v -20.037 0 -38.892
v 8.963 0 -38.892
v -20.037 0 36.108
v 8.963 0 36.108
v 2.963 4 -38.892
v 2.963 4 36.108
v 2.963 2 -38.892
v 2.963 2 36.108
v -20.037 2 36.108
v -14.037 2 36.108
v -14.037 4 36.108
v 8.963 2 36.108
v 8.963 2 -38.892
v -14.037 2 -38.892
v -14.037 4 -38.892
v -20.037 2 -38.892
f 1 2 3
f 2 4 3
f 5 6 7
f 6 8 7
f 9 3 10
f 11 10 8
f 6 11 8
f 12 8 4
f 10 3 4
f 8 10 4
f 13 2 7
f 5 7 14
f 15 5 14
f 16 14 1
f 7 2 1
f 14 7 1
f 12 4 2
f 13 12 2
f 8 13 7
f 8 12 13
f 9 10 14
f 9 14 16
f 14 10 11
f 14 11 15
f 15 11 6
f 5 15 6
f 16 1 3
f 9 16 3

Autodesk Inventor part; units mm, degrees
ref_plane "YZ Plane" through (0, 0, 0) normal (1, 0, 0) x (0, 1, 0)
ref_plane "XZ Plane" through (0, 0, 0) normal (0, 1, 0) x (-1, 0, 0)
ref_plane "XY Plane" through (0, 0, 0) normal (0, 0, 1) x (1, 0, 0)
sketch "Sketch1" plane through (0, 0, 0) normal (0, 1, 0) x (-1, 0, 0)
  line L0 (20.0371, 36.1085) -> (-8.9629, 36.1085)
  line L1 (-8.9629, 36.1085) -> (-8.9629, -38.8915)
  line L2 (-8.9629, -38.8915) -> (20.0371, -38.8915)
  line L3 (20.0371, -38.8915) -> (20.0371, 36.1085)
  point P0 (0, 0)
  dimension "d0" = 75
  dimension "d1" = 29
extrude "Extrusion1" add sketch "Sketch1" along normal blind 2
sketch "Sketch2" plane through (0, 2, 0) normal (0, 1, 0) x (1, 0, 0)
  line L0 (-20.0371, -36.1085) -> (8.9629, -36.1085) projected
  line L1 (2.9629, -36.1085) -> (2.9629, 38.8915)
  line L2 (8.9629, 38.8915) -> (-20.0371, 38.8915) projected
  line L3 (-14.0371, -36.1085) -> (-14.0371, 38.8915)
  point P0 (0, 0)
  dimension "d4" = 6
  dimension "d5" = 6
extrude "Extrusion2" add sketch "Sketch2" along normal blind 2
